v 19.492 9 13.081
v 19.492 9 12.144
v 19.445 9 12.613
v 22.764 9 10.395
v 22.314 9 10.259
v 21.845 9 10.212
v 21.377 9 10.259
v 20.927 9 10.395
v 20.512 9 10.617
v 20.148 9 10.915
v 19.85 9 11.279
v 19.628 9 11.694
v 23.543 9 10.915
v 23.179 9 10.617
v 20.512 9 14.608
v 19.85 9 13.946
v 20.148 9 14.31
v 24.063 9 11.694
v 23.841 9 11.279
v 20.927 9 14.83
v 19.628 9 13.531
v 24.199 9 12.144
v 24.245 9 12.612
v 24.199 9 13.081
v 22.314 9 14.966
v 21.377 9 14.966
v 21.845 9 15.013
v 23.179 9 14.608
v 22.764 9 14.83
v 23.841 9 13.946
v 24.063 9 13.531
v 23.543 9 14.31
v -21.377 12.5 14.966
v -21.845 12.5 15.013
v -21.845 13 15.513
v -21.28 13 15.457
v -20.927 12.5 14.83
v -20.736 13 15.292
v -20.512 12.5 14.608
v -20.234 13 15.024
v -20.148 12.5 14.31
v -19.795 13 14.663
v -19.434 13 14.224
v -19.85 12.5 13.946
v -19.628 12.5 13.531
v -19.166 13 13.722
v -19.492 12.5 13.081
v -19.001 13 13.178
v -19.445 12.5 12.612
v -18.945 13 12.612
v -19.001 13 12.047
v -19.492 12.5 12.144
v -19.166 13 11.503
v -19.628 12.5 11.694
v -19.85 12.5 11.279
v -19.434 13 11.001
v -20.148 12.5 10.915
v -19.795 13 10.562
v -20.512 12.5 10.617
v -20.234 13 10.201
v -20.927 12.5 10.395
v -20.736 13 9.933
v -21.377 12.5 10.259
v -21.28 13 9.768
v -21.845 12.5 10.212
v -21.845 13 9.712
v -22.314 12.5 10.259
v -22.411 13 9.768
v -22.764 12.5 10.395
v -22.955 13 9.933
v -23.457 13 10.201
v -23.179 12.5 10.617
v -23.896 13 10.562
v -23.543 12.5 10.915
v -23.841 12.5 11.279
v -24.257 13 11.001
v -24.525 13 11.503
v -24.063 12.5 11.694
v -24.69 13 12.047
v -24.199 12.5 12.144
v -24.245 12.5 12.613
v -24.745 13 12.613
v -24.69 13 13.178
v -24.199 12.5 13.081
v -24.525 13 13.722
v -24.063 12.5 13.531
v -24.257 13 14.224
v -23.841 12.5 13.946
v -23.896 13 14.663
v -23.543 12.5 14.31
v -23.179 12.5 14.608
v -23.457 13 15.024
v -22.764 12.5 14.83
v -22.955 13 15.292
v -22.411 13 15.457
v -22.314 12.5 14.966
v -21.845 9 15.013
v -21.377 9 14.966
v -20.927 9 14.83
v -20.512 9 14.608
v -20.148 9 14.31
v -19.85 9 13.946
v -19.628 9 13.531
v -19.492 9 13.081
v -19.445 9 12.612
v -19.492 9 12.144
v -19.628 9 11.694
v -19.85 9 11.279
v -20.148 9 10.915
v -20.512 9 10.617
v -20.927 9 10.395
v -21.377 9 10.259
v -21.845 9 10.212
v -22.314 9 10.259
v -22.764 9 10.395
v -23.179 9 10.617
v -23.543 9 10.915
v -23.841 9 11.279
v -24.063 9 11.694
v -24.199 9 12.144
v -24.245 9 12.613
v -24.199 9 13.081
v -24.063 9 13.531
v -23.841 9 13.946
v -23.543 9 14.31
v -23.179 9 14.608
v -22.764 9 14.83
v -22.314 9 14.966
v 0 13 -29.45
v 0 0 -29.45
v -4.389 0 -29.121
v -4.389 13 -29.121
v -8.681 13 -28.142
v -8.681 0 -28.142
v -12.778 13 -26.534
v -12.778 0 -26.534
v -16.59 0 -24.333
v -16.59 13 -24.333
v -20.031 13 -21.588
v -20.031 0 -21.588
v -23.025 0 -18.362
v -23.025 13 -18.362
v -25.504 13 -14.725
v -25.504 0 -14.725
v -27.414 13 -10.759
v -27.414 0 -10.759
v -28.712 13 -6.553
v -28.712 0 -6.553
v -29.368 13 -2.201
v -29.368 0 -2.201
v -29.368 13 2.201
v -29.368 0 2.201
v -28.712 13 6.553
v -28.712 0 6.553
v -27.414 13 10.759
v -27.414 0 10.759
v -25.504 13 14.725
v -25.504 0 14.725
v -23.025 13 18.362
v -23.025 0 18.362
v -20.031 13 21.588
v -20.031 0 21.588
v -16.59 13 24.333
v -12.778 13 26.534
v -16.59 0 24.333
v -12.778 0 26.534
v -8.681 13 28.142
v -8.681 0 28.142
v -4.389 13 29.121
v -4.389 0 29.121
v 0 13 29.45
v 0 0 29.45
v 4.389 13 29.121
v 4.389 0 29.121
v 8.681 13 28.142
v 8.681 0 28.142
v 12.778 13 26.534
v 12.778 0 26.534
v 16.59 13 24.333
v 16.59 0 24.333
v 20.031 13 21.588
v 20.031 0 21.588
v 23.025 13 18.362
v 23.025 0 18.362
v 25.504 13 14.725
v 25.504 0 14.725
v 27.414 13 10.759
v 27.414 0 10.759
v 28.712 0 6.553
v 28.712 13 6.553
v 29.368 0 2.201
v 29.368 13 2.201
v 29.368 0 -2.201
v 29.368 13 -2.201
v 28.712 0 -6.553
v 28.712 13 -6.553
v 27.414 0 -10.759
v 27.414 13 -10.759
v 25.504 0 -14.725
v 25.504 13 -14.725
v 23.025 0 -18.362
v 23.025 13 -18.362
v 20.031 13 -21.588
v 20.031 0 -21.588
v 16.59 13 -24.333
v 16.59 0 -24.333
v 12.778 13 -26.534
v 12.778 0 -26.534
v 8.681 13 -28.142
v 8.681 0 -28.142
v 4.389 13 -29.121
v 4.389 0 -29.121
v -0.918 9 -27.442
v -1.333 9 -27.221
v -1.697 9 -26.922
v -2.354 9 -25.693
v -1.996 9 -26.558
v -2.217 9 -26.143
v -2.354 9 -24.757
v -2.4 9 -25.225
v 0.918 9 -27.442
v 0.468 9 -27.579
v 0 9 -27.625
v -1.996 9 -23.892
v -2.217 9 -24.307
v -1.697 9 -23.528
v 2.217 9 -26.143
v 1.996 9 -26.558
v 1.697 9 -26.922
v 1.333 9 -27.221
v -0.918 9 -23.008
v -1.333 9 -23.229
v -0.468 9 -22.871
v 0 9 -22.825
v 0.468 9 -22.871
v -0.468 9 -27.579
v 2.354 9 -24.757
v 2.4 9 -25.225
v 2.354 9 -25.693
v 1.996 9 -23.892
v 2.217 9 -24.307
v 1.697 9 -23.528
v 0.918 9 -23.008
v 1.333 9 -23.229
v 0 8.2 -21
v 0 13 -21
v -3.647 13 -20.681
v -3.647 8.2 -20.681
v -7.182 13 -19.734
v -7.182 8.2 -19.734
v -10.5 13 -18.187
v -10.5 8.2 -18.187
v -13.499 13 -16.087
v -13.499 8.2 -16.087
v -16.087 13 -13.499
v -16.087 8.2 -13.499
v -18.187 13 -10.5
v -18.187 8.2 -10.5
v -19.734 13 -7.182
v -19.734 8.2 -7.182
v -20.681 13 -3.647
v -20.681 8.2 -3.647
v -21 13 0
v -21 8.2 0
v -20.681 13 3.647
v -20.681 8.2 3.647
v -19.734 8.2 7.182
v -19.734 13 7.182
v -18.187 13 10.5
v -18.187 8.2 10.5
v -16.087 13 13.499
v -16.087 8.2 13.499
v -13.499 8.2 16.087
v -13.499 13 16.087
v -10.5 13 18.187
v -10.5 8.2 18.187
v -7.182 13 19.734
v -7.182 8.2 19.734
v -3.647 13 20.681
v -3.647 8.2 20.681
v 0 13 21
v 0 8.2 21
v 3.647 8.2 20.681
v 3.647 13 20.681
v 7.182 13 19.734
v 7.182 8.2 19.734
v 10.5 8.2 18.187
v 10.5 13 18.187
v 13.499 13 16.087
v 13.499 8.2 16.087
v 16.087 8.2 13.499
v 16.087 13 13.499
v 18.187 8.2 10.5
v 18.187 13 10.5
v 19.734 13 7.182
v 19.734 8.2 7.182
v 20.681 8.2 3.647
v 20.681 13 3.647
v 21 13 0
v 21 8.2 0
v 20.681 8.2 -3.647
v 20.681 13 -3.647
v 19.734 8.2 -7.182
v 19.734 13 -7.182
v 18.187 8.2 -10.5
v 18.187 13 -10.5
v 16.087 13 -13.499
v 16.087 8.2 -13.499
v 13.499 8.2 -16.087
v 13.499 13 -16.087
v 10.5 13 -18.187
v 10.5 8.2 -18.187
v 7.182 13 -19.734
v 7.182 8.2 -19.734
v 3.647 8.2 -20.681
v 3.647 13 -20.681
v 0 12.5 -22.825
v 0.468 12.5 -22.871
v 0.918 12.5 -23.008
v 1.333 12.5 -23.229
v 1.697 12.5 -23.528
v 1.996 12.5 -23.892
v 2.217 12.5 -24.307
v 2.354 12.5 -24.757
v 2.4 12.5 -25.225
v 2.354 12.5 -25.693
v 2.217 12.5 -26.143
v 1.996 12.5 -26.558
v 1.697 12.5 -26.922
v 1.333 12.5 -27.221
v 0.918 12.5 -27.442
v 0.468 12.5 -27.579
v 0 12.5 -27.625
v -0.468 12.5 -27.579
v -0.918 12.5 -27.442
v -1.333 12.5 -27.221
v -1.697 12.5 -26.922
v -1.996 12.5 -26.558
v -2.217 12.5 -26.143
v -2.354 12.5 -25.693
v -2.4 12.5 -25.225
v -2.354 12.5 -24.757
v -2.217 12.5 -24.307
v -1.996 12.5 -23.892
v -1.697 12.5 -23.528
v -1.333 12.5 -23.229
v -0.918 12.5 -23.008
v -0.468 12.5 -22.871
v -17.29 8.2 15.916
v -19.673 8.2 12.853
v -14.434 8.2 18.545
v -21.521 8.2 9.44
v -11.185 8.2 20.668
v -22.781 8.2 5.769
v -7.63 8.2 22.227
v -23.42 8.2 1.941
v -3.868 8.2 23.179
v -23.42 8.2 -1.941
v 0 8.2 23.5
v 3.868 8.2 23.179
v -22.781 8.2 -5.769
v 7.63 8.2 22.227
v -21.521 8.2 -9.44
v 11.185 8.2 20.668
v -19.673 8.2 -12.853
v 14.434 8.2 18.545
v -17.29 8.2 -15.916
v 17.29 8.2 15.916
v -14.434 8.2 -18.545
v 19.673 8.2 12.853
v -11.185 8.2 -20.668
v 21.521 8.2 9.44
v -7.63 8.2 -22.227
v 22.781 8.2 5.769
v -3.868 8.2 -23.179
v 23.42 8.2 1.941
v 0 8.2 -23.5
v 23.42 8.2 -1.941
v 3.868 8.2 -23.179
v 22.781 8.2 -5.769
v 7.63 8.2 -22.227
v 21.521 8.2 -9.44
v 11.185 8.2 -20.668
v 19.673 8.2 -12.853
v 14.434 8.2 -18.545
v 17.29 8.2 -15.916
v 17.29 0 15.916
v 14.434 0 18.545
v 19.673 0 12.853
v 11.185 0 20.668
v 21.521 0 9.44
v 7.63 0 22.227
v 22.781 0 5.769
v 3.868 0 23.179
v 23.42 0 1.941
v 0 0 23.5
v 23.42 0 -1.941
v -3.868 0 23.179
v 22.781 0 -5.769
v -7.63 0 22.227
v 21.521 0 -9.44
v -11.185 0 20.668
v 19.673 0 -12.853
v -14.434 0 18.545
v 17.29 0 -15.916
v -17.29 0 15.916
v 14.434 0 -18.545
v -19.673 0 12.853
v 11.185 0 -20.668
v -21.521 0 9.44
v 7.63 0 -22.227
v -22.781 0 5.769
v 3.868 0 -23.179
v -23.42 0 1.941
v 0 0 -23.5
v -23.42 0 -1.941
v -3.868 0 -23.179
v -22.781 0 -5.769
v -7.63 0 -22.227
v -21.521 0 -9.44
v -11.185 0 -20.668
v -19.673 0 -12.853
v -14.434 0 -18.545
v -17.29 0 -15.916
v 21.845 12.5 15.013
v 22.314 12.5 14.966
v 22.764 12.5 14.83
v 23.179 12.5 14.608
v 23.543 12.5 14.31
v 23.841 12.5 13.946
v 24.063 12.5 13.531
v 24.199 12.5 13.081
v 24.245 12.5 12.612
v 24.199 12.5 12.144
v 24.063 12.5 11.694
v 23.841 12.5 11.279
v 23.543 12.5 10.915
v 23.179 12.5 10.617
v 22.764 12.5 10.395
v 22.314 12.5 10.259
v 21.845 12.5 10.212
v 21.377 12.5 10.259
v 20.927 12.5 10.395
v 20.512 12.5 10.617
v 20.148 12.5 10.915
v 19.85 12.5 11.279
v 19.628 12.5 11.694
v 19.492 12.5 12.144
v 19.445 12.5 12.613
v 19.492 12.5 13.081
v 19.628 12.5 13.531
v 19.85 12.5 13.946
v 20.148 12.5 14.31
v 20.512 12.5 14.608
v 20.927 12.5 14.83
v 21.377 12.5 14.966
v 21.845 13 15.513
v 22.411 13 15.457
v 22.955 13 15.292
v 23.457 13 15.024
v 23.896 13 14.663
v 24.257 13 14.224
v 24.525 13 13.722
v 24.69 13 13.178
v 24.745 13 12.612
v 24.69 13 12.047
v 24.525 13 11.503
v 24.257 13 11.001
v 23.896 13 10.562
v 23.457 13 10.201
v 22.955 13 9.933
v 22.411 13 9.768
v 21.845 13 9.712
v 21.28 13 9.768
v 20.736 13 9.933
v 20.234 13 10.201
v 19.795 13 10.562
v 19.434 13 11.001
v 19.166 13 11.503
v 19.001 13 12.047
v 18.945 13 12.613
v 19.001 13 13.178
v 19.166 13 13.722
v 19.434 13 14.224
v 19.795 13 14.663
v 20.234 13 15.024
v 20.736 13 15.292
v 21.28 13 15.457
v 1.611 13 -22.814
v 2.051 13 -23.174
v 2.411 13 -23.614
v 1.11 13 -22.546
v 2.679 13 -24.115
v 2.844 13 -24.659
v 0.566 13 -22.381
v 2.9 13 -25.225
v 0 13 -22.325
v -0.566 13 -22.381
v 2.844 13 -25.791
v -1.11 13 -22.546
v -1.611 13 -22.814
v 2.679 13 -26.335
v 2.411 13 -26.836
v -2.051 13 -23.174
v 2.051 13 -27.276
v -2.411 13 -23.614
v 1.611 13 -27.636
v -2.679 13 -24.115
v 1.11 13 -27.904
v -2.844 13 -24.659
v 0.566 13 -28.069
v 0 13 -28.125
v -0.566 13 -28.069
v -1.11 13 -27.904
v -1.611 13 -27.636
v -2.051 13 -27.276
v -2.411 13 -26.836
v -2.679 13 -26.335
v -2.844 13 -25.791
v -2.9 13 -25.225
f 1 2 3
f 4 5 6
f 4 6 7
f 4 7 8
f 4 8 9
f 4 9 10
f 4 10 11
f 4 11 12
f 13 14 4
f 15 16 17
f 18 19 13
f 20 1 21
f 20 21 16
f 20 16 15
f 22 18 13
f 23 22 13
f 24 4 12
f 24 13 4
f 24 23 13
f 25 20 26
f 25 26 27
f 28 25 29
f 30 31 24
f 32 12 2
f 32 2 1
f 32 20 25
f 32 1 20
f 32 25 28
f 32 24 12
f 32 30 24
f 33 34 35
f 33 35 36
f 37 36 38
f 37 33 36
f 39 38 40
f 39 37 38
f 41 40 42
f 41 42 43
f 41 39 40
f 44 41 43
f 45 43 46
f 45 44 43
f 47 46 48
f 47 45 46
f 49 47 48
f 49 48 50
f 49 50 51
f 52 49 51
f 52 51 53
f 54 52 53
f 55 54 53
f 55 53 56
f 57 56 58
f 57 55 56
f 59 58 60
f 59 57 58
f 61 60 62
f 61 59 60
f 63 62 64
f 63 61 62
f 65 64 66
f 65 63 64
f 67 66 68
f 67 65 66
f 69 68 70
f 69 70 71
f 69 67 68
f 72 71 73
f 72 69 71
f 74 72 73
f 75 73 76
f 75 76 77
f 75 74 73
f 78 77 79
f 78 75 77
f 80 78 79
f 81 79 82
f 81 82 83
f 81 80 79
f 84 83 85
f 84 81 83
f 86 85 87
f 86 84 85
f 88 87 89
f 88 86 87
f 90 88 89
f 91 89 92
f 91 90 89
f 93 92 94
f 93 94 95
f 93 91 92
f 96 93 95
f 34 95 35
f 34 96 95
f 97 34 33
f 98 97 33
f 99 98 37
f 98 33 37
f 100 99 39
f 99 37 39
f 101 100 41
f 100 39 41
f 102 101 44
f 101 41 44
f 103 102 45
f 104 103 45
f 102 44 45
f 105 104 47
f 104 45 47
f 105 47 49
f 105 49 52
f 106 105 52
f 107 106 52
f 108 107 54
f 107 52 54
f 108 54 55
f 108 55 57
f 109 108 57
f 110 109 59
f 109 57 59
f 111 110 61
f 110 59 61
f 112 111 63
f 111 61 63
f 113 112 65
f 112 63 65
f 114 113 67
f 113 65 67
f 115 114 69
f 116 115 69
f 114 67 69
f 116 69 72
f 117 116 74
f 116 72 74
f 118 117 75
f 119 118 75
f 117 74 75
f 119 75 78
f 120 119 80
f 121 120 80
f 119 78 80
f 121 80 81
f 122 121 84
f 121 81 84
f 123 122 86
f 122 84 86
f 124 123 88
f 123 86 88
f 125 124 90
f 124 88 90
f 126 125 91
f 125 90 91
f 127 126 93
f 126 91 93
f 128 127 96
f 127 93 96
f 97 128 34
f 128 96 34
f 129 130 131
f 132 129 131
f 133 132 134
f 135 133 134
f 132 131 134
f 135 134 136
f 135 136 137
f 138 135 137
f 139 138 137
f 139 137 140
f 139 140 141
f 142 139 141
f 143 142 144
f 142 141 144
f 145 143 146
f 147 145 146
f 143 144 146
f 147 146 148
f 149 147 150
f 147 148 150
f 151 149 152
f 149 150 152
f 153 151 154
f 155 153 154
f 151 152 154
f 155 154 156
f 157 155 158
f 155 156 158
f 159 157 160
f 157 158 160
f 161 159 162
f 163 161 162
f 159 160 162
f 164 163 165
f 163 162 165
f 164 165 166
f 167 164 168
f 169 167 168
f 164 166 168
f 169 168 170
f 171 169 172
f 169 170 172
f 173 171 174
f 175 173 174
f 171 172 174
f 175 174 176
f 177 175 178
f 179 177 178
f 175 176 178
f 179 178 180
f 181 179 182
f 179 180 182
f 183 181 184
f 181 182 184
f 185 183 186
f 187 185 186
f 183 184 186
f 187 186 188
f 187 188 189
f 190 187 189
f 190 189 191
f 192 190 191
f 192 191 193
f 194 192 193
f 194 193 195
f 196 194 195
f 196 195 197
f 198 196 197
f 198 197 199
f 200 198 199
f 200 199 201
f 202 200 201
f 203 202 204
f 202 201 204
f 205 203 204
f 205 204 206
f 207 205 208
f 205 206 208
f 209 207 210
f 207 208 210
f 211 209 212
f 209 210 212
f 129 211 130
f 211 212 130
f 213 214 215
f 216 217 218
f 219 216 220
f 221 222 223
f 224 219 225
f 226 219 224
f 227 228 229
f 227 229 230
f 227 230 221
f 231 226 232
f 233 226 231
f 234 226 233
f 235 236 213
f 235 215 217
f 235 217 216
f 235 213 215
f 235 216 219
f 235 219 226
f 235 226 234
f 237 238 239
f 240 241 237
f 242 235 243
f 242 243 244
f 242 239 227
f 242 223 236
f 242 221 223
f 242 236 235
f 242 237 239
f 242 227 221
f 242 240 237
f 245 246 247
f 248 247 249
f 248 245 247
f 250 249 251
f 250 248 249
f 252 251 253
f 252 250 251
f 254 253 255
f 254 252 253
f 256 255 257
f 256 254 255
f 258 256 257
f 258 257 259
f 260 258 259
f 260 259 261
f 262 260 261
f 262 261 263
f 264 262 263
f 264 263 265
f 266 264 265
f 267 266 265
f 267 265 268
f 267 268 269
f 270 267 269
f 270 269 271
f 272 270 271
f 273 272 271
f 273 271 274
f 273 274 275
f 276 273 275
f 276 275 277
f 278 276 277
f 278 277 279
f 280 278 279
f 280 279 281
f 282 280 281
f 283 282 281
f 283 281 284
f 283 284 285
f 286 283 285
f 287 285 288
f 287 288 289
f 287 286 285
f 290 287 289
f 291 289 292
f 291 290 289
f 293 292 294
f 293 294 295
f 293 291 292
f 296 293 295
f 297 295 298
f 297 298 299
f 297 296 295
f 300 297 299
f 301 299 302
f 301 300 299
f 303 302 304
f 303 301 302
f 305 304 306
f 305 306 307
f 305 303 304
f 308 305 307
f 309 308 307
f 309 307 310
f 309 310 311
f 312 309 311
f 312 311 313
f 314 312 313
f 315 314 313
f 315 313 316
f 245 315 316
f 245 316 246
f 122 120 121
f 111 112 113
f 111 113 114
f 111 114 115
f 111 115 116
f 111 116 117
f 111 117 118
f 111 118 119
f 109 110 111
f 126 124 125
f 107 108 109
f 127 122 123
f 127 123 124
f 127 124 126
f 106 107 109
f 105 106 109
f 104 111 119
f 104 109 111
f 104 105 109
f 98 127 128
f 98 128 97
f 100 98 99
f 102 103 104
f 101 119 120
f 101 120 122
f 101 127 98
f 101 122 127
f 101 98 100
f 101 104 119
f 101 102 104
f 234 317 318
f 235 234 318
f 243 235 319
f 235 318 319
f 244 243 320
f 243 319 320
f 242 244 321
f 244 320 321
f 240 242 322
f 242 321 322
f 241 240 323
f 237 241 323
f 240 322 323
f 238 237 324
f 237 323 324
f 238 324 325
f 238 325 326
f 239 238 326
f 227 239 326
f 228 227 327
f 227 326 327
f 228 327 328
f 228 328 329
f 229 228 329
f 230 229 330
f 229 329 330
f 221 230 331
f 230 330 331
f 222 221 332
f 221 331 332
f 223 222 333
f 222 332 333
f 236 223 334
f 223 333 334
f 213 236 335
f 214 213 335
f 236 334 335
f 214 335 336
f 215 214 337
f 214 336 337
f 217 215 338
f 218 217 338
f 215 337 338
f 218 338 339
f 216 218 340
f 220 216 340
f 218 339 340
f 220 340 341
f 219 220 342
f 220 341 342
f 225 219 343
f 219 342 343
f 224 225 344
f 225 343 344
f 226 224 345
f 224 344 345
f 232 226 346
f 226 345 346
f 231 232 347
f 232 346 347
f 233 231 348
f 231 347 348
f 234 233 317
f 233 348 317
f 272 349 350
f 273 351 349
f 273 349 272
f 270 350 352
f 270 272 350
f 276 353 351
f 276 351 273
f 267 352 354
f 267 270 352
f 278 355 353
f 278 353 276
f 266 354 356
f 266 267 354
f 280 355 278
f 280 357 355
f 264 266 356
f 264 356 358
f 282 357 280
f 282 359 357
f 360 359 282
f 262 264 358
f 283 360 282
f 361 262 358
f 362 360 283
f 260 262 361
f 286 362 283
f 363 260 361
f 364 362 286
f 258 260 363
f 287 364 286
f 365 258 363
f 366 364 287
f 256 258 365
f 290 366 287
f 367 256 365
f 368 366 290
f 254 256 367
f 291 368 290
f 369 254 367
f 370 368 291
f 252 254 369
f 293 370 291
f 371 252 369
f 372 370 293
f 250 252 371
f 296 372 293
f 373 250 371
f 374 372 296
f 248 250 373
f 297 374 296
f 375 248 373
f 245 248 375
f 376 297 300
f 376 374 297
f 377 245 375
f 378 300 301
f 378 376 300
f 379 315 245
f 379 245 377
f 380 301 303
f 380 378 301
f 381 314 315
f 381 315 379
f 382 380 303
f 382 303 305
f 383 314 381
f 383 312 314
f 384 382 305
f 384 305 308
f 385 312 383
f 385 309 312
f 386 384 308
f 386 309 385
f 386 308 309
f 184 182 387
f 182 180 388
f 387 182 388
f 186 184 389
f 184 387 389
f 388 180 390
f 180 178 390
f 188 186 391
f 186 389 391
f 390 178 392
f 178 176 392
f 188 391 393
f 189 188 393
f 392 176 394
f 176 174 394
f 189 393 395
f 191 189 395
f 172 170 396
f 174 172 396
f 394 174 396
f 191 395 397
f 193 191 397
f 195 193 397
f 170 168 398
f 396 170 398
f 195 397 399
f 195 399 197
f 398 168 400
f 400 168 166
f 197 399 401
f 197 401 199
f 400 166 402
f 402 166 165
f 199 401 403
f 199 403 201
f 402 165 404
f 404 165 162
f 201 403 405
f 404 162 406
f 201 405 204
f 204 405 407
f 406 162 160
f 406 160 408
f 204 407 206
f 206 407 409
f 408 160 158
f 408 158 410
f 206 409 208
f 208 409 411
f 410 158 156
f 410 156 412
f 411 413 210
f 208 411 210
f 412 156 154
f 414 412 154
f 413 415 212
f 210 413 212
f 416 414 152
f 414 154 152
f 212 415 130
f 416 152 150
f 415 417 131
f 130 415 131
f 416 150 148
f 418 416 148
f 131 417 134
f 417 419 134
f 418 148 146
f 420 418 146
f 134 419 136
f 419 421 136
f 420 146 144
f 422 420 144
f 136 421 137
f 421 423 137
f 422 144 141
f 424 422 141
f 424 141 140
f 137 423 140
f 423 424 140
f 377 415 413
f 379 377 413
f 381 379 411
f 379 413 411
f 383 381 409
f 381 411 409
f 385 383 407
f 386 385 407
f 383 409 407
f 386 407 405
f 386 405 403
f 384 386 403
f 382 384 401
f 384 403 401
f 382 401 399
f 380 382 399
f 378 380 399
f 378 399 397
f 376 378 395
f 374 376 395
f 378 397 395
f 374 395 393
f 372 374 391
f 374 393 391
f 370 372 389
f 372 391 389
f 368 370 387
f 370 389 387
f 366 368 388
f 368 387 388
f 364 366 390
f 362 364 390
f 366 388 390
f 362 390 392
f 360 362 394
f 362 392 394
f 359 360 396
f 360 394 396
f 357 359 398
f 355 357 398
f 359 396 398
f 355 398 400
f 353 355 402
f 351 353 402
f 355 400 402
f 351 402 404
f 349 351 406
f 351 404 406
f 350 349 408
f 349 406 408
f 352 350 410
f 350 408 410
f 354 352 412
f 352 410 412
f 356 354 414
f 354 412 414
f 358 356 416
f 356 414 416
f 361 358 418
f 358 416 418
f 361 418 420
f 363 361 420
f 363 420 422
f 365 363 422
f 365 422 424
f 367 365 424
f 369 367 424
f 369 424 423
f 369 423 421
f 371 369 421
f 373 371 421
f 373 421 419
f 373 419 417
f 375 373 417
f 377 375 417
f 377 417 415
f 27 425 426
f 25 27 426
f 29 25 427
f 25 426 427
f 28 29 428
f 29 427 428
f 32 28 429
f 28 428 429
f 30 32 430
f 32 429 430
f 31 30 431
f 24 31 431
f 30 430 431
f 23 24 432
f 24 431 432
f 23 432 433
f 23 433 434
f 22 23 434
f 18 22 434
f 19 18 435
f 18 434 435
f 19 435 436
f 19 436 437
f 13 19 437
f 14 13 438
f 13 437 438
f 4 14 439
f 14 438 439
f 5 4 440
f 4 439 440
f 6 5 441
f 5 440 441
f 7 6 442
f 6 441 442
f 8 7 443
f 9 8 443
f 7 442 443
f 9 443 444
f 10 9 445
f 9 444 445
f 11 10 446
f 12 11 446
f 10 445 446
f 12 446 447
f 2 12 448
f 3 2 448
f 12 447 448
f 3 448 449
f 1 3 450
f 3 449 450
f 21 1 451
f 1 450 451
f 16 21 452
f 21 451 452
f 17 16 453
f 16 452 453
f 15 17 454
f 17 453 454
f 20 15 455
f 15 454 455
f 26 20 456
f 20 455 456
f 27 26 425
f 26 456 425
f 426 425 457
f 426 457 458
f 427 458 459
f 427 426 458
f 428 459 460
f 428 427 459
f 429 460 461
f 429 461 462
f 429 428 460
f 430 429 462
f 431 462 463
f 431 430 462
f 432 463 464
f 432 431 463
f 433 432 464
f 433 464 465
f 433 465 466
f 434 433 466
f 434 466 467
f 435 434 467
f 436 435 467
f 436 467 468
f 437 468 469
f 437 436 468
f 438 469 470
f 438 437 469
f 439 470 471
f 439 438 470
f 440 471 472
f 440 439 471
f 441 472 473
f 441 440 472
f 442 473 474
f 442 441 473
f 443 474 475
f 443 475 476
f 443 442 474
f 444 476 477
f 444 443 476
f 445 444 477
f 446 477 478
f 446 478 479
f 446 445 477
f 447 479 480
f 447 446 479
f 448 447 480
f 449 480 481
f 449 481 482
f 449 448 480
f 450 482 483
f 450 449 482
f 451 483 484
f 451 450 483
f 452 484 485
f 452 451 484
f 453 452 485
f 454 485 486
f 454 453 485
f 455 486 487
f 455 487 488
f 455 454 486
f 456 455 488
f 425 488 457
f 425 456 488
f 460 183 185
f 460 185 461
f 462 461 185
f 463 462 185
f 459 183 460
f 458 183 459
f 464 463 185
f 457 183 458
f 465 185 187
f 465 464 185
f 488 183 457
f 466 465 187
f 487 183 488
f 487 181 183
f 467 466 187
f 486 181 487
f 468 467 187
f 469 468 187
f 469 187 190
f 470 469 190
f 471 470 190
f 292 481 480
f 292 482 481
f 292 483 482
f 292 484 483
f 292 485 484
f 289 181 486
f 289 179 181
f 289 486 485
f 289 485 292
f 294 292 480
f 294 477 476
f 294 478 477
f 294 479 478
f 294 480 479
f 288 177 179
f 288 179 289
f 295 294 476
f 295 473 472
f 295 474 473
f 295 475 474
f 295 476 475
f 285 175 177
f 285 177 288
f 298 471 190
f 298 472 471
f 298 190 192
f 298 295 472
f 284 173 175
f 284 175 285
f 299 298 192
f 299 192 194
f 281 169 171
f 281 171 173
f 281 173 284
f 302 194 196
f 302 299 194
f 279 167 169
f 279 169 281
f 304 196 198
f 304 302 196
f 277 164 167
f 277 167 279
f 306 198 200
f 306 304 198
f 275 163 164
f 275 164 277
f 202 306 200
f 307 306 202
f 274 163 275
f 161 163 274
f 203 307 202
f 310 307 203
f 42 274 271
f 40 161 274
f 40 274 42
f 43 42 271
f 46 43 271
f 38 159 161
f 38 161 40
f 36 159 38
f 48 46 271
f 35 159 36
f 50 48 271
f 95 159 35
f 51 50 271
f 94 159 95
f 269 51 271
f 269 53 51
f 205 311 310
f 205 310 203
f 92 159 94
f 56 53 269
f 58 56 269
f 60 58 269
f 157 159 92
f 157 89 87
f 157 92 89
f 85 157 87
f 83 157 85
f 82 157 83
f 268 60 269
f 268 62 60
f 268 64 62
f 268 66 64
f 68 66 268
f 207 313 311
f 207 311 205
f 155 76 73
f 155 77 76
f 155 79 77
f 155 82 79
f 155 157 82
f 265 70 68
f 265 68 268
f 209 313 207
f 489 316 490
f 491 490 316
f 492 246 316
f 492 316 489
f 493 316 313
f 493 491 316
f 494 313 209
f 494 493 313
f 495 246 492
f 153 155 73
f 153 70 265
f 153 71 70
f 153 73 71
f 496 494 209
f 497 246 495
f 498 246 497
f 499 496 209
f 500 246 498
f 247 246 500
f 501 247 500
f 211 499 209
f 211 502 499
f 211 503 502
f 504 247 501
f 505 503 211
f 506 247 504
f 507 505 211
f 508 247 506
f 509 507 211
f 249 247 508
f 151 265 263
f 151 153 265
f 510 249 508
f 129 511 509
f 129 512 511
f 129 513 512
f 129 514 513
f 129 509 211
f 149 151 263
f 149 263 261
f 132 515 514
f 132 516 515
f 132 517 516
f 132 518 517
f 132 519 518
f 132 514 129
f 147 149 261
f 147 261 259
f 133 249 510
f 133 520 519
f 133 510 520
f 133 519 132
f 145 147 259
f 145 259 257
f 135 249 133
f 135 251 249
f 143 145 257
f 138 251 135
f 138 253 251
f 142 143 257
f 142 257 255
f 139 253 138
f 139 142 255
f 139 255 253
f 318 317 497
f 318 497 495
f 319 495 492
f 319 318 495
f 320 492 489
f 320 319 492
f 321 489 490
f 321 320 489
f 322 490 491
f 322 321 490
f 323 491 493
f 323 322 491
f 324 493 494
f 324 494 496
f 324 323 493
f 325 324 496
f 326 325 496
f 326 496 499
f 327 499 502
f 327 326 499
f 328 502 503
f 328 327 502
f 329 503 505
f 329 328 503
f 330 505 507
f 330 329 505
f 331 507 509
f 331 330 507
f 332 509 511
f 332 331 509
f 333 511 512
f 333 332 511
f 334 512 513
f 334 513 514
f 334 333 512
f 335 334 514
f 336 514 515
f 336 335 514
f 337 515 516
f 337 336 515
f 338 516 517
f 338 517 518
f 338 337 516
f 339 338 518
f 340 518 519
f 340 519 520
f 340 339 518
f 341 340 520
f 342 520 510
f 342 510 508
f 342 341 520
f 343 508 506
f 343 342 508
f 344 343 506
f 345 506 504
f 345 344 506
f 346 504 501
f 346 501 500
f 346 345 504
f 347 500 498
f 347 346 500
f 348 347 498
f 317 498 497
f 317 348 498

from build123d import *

# Parameters (mm, degrees)
SKETCH1_R           = 29.45
SKETCH1_R_2         = 21
BOSS_EXTRUDE1_DEPTH = 13
SKETCH2_R           = 2.4
CUT_EXTRUDE1_DEPTH  = 4
CHAMFER1_SIZE       = 0.5
SKETCH4_R           = 23.5
CUT_EXTRUDE2_DEPTH  = 8.2


with BuildPart() as part:
    # Sketch1 → Boss-Extrude1 (new body)
    with BuildSketch(Plane(origin=(0, 0, 0), x_dir=(1, 0, 0), z_dir=(0, 1, 0))):
        with Locations(Location((0, 0, 0), (0, 0, 90))):
            Circle(SKETCH1_R)
        with Locations(Location((0, 0, 0), (0, 0, 90))):
            Circle(SKETCH1_R_2, mode=Mode.SUBTRACT)
    extrude(amount=BOSS_EXTRUDE1_DEPTH)

    # Sketch2 → Cut-Extrude1 (cut)
    with BuildSketch(Plane(origin=(0, 13, 0), x_dir=(1, 0, 0), z_dir=(0, 1, 0))):
        with Locations(Location((0, 25.225, 0), (0, 0, 270))):
            Circle(SKETCH2_R)
        with Locations(Location((21.84549081, -12.6125, 0), (0, 0, 270))):
            Circle(SKETCH2_R)
        with Locations(Location((-21.84549081, -12.6125, 0), (0, 0, 270))):
            Circle(SKETCH2_R)
    extrude(amount=-CUT_EXTRUDE1_DEPTH, mode=Mode.SUBTRACT)

    # Chamfer1
    chamfer1_edges = [part.edges().sort_by_distance(p)[0] for p in [
        (0, 13, -27.625),
        (21.84549081, 13, 10.2125),
        (-21.84549081, 13, 10.2125),
    ]]
    chamfer(chamfer1_edges, length=CHAMFER1_SIZE)

    # Sketch4 → Cut-Extrude2 (cut)
    with BuildSketch(Plane.XZ):
        with Locations(Location((0, 0, 0), (0, 0, 270))):
            Circle(SKETCH4_R)
    extrude(amount=-CUT_EXTRUDE2_DEPTH, mode=Mode.SUBTRACT)


solid = part.part
